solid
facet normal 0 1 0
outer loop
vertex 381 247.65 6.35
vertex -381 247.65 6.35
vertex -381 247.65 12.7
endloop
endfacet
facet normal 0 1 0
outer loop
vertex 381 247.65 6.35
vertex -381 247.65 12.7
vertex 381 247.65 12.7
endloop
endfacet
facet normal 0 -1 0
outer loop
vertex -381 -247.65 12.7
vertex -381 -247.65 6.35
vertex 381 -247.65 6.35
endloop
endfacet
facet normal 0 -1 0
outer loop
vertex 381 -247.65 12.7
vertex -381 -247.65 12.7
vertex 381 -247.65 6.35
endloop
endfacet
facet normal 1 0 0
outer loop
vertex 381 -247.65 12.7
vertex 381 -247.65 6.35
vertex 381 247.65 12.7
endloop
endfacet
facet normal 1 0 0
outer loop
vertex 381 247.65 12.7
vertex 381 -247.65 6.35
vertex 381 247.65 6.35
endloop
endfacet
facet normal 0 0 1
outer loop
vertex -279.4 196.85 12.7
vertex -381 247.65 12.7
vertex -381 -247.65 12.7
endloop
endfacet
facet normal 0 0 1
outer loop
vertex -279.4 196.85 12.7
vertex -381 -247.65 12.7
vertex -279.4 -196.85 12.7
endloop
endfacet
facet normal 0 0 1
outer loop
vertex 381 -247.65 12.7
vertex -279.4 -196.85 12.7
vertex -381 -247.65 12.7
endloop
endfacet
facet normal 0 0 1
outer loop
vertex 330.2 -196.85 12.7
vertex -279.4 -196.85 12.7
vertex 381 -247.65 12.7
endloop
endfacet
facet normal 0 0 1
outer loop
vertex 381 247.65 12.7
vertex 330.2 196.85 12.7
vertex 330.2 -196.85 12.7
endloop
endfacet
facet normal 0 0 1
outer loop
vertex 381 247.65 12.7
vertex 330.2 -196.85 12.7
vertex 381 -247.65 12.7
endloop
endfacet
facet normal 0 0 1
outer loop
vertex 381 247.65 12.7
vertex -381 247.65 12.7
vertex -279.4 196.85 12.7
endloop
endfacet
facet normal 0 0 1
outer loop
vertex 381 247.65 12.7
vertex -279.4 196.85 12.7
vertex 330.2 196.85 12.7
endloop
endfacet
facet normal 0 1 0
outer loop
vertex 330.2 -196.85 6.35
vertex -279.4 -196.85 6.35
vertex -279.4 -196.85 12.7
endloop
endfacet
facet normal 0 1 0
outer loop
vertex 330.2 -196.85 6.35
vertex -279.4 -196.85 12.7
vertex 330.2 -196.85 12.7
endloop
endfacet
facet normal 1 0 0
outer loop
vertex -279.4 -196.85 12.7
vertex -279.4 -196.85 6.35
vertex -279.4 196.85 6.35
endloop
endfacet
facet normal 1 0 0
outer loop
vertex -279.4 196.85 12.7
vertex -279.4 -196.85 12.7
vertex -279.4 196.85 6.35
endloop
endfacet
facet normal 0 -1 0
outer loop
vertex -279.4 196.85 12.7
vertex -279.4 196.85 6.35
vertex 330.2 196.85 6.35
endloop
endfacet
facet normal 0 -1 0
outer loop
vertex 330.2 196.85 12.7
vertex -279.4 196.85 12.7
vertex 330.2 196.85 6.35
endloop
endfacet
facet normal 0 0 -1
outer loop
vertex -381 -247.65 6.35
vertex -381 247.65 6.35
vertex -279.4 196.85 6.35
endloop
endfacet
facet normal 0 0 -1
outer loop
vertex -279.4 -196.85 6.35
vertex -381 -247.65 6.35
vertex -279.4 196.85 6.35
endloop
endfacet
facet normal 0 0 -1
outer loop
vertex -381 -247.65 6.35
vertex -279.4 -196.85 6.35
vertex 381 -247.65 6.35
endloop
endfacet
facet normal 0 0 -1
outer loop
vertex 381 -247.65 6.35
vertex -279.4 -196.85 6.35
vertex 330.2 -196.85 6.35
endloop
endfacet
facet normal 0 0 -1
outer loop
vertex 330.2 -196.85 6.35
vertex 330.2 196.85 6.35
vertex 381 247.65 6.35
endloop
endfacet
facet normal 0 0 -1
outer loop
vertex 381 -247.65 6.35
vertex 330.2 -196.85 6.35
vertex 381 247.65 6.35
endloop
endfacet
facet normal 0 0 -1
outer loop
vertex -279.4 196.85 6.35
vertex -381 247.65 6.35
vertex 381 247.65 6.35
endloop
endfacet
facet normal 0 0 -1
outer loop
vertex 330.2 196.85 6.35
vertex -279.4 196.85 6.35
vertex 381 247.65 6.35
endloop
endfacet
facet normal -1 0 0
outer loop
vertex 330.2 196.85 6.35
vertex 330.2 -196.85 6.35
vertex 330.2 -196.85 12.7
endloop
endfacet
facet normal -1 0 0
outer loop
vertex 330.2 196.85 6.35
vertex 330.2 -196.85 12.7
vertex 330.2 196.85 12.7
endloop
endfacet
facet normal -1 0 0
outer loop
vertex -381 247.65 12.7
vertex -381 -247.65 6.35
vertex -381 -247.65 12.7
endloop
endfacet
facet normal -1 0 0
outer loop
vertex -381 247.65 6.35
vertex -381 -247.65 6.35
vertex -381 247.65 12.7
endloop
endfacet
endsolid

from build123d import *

# Parameters (mm, degrees)
SKETCH_W   = 762
SKETCH_H   = 495.3
SKETCH_W_2 = 609.6
SKETCH_H_2 = 393.7
PAD_DEPTH  = 6.35


with BuildPart() as part:
    # Sketch → Pad (new body)
    with BuildSketch(Plane.XY.offset(6.35)):
        Rectangle(SKETCH_W, SKETCH_H)
        with Locations((25.4, 0)):
            Rectangle(SKETCH_W_2, SKETCH_H_2, mode=Mode.SUBTRACT)
    extrude(amount=PAD_DEPTH)


solid = part.part
